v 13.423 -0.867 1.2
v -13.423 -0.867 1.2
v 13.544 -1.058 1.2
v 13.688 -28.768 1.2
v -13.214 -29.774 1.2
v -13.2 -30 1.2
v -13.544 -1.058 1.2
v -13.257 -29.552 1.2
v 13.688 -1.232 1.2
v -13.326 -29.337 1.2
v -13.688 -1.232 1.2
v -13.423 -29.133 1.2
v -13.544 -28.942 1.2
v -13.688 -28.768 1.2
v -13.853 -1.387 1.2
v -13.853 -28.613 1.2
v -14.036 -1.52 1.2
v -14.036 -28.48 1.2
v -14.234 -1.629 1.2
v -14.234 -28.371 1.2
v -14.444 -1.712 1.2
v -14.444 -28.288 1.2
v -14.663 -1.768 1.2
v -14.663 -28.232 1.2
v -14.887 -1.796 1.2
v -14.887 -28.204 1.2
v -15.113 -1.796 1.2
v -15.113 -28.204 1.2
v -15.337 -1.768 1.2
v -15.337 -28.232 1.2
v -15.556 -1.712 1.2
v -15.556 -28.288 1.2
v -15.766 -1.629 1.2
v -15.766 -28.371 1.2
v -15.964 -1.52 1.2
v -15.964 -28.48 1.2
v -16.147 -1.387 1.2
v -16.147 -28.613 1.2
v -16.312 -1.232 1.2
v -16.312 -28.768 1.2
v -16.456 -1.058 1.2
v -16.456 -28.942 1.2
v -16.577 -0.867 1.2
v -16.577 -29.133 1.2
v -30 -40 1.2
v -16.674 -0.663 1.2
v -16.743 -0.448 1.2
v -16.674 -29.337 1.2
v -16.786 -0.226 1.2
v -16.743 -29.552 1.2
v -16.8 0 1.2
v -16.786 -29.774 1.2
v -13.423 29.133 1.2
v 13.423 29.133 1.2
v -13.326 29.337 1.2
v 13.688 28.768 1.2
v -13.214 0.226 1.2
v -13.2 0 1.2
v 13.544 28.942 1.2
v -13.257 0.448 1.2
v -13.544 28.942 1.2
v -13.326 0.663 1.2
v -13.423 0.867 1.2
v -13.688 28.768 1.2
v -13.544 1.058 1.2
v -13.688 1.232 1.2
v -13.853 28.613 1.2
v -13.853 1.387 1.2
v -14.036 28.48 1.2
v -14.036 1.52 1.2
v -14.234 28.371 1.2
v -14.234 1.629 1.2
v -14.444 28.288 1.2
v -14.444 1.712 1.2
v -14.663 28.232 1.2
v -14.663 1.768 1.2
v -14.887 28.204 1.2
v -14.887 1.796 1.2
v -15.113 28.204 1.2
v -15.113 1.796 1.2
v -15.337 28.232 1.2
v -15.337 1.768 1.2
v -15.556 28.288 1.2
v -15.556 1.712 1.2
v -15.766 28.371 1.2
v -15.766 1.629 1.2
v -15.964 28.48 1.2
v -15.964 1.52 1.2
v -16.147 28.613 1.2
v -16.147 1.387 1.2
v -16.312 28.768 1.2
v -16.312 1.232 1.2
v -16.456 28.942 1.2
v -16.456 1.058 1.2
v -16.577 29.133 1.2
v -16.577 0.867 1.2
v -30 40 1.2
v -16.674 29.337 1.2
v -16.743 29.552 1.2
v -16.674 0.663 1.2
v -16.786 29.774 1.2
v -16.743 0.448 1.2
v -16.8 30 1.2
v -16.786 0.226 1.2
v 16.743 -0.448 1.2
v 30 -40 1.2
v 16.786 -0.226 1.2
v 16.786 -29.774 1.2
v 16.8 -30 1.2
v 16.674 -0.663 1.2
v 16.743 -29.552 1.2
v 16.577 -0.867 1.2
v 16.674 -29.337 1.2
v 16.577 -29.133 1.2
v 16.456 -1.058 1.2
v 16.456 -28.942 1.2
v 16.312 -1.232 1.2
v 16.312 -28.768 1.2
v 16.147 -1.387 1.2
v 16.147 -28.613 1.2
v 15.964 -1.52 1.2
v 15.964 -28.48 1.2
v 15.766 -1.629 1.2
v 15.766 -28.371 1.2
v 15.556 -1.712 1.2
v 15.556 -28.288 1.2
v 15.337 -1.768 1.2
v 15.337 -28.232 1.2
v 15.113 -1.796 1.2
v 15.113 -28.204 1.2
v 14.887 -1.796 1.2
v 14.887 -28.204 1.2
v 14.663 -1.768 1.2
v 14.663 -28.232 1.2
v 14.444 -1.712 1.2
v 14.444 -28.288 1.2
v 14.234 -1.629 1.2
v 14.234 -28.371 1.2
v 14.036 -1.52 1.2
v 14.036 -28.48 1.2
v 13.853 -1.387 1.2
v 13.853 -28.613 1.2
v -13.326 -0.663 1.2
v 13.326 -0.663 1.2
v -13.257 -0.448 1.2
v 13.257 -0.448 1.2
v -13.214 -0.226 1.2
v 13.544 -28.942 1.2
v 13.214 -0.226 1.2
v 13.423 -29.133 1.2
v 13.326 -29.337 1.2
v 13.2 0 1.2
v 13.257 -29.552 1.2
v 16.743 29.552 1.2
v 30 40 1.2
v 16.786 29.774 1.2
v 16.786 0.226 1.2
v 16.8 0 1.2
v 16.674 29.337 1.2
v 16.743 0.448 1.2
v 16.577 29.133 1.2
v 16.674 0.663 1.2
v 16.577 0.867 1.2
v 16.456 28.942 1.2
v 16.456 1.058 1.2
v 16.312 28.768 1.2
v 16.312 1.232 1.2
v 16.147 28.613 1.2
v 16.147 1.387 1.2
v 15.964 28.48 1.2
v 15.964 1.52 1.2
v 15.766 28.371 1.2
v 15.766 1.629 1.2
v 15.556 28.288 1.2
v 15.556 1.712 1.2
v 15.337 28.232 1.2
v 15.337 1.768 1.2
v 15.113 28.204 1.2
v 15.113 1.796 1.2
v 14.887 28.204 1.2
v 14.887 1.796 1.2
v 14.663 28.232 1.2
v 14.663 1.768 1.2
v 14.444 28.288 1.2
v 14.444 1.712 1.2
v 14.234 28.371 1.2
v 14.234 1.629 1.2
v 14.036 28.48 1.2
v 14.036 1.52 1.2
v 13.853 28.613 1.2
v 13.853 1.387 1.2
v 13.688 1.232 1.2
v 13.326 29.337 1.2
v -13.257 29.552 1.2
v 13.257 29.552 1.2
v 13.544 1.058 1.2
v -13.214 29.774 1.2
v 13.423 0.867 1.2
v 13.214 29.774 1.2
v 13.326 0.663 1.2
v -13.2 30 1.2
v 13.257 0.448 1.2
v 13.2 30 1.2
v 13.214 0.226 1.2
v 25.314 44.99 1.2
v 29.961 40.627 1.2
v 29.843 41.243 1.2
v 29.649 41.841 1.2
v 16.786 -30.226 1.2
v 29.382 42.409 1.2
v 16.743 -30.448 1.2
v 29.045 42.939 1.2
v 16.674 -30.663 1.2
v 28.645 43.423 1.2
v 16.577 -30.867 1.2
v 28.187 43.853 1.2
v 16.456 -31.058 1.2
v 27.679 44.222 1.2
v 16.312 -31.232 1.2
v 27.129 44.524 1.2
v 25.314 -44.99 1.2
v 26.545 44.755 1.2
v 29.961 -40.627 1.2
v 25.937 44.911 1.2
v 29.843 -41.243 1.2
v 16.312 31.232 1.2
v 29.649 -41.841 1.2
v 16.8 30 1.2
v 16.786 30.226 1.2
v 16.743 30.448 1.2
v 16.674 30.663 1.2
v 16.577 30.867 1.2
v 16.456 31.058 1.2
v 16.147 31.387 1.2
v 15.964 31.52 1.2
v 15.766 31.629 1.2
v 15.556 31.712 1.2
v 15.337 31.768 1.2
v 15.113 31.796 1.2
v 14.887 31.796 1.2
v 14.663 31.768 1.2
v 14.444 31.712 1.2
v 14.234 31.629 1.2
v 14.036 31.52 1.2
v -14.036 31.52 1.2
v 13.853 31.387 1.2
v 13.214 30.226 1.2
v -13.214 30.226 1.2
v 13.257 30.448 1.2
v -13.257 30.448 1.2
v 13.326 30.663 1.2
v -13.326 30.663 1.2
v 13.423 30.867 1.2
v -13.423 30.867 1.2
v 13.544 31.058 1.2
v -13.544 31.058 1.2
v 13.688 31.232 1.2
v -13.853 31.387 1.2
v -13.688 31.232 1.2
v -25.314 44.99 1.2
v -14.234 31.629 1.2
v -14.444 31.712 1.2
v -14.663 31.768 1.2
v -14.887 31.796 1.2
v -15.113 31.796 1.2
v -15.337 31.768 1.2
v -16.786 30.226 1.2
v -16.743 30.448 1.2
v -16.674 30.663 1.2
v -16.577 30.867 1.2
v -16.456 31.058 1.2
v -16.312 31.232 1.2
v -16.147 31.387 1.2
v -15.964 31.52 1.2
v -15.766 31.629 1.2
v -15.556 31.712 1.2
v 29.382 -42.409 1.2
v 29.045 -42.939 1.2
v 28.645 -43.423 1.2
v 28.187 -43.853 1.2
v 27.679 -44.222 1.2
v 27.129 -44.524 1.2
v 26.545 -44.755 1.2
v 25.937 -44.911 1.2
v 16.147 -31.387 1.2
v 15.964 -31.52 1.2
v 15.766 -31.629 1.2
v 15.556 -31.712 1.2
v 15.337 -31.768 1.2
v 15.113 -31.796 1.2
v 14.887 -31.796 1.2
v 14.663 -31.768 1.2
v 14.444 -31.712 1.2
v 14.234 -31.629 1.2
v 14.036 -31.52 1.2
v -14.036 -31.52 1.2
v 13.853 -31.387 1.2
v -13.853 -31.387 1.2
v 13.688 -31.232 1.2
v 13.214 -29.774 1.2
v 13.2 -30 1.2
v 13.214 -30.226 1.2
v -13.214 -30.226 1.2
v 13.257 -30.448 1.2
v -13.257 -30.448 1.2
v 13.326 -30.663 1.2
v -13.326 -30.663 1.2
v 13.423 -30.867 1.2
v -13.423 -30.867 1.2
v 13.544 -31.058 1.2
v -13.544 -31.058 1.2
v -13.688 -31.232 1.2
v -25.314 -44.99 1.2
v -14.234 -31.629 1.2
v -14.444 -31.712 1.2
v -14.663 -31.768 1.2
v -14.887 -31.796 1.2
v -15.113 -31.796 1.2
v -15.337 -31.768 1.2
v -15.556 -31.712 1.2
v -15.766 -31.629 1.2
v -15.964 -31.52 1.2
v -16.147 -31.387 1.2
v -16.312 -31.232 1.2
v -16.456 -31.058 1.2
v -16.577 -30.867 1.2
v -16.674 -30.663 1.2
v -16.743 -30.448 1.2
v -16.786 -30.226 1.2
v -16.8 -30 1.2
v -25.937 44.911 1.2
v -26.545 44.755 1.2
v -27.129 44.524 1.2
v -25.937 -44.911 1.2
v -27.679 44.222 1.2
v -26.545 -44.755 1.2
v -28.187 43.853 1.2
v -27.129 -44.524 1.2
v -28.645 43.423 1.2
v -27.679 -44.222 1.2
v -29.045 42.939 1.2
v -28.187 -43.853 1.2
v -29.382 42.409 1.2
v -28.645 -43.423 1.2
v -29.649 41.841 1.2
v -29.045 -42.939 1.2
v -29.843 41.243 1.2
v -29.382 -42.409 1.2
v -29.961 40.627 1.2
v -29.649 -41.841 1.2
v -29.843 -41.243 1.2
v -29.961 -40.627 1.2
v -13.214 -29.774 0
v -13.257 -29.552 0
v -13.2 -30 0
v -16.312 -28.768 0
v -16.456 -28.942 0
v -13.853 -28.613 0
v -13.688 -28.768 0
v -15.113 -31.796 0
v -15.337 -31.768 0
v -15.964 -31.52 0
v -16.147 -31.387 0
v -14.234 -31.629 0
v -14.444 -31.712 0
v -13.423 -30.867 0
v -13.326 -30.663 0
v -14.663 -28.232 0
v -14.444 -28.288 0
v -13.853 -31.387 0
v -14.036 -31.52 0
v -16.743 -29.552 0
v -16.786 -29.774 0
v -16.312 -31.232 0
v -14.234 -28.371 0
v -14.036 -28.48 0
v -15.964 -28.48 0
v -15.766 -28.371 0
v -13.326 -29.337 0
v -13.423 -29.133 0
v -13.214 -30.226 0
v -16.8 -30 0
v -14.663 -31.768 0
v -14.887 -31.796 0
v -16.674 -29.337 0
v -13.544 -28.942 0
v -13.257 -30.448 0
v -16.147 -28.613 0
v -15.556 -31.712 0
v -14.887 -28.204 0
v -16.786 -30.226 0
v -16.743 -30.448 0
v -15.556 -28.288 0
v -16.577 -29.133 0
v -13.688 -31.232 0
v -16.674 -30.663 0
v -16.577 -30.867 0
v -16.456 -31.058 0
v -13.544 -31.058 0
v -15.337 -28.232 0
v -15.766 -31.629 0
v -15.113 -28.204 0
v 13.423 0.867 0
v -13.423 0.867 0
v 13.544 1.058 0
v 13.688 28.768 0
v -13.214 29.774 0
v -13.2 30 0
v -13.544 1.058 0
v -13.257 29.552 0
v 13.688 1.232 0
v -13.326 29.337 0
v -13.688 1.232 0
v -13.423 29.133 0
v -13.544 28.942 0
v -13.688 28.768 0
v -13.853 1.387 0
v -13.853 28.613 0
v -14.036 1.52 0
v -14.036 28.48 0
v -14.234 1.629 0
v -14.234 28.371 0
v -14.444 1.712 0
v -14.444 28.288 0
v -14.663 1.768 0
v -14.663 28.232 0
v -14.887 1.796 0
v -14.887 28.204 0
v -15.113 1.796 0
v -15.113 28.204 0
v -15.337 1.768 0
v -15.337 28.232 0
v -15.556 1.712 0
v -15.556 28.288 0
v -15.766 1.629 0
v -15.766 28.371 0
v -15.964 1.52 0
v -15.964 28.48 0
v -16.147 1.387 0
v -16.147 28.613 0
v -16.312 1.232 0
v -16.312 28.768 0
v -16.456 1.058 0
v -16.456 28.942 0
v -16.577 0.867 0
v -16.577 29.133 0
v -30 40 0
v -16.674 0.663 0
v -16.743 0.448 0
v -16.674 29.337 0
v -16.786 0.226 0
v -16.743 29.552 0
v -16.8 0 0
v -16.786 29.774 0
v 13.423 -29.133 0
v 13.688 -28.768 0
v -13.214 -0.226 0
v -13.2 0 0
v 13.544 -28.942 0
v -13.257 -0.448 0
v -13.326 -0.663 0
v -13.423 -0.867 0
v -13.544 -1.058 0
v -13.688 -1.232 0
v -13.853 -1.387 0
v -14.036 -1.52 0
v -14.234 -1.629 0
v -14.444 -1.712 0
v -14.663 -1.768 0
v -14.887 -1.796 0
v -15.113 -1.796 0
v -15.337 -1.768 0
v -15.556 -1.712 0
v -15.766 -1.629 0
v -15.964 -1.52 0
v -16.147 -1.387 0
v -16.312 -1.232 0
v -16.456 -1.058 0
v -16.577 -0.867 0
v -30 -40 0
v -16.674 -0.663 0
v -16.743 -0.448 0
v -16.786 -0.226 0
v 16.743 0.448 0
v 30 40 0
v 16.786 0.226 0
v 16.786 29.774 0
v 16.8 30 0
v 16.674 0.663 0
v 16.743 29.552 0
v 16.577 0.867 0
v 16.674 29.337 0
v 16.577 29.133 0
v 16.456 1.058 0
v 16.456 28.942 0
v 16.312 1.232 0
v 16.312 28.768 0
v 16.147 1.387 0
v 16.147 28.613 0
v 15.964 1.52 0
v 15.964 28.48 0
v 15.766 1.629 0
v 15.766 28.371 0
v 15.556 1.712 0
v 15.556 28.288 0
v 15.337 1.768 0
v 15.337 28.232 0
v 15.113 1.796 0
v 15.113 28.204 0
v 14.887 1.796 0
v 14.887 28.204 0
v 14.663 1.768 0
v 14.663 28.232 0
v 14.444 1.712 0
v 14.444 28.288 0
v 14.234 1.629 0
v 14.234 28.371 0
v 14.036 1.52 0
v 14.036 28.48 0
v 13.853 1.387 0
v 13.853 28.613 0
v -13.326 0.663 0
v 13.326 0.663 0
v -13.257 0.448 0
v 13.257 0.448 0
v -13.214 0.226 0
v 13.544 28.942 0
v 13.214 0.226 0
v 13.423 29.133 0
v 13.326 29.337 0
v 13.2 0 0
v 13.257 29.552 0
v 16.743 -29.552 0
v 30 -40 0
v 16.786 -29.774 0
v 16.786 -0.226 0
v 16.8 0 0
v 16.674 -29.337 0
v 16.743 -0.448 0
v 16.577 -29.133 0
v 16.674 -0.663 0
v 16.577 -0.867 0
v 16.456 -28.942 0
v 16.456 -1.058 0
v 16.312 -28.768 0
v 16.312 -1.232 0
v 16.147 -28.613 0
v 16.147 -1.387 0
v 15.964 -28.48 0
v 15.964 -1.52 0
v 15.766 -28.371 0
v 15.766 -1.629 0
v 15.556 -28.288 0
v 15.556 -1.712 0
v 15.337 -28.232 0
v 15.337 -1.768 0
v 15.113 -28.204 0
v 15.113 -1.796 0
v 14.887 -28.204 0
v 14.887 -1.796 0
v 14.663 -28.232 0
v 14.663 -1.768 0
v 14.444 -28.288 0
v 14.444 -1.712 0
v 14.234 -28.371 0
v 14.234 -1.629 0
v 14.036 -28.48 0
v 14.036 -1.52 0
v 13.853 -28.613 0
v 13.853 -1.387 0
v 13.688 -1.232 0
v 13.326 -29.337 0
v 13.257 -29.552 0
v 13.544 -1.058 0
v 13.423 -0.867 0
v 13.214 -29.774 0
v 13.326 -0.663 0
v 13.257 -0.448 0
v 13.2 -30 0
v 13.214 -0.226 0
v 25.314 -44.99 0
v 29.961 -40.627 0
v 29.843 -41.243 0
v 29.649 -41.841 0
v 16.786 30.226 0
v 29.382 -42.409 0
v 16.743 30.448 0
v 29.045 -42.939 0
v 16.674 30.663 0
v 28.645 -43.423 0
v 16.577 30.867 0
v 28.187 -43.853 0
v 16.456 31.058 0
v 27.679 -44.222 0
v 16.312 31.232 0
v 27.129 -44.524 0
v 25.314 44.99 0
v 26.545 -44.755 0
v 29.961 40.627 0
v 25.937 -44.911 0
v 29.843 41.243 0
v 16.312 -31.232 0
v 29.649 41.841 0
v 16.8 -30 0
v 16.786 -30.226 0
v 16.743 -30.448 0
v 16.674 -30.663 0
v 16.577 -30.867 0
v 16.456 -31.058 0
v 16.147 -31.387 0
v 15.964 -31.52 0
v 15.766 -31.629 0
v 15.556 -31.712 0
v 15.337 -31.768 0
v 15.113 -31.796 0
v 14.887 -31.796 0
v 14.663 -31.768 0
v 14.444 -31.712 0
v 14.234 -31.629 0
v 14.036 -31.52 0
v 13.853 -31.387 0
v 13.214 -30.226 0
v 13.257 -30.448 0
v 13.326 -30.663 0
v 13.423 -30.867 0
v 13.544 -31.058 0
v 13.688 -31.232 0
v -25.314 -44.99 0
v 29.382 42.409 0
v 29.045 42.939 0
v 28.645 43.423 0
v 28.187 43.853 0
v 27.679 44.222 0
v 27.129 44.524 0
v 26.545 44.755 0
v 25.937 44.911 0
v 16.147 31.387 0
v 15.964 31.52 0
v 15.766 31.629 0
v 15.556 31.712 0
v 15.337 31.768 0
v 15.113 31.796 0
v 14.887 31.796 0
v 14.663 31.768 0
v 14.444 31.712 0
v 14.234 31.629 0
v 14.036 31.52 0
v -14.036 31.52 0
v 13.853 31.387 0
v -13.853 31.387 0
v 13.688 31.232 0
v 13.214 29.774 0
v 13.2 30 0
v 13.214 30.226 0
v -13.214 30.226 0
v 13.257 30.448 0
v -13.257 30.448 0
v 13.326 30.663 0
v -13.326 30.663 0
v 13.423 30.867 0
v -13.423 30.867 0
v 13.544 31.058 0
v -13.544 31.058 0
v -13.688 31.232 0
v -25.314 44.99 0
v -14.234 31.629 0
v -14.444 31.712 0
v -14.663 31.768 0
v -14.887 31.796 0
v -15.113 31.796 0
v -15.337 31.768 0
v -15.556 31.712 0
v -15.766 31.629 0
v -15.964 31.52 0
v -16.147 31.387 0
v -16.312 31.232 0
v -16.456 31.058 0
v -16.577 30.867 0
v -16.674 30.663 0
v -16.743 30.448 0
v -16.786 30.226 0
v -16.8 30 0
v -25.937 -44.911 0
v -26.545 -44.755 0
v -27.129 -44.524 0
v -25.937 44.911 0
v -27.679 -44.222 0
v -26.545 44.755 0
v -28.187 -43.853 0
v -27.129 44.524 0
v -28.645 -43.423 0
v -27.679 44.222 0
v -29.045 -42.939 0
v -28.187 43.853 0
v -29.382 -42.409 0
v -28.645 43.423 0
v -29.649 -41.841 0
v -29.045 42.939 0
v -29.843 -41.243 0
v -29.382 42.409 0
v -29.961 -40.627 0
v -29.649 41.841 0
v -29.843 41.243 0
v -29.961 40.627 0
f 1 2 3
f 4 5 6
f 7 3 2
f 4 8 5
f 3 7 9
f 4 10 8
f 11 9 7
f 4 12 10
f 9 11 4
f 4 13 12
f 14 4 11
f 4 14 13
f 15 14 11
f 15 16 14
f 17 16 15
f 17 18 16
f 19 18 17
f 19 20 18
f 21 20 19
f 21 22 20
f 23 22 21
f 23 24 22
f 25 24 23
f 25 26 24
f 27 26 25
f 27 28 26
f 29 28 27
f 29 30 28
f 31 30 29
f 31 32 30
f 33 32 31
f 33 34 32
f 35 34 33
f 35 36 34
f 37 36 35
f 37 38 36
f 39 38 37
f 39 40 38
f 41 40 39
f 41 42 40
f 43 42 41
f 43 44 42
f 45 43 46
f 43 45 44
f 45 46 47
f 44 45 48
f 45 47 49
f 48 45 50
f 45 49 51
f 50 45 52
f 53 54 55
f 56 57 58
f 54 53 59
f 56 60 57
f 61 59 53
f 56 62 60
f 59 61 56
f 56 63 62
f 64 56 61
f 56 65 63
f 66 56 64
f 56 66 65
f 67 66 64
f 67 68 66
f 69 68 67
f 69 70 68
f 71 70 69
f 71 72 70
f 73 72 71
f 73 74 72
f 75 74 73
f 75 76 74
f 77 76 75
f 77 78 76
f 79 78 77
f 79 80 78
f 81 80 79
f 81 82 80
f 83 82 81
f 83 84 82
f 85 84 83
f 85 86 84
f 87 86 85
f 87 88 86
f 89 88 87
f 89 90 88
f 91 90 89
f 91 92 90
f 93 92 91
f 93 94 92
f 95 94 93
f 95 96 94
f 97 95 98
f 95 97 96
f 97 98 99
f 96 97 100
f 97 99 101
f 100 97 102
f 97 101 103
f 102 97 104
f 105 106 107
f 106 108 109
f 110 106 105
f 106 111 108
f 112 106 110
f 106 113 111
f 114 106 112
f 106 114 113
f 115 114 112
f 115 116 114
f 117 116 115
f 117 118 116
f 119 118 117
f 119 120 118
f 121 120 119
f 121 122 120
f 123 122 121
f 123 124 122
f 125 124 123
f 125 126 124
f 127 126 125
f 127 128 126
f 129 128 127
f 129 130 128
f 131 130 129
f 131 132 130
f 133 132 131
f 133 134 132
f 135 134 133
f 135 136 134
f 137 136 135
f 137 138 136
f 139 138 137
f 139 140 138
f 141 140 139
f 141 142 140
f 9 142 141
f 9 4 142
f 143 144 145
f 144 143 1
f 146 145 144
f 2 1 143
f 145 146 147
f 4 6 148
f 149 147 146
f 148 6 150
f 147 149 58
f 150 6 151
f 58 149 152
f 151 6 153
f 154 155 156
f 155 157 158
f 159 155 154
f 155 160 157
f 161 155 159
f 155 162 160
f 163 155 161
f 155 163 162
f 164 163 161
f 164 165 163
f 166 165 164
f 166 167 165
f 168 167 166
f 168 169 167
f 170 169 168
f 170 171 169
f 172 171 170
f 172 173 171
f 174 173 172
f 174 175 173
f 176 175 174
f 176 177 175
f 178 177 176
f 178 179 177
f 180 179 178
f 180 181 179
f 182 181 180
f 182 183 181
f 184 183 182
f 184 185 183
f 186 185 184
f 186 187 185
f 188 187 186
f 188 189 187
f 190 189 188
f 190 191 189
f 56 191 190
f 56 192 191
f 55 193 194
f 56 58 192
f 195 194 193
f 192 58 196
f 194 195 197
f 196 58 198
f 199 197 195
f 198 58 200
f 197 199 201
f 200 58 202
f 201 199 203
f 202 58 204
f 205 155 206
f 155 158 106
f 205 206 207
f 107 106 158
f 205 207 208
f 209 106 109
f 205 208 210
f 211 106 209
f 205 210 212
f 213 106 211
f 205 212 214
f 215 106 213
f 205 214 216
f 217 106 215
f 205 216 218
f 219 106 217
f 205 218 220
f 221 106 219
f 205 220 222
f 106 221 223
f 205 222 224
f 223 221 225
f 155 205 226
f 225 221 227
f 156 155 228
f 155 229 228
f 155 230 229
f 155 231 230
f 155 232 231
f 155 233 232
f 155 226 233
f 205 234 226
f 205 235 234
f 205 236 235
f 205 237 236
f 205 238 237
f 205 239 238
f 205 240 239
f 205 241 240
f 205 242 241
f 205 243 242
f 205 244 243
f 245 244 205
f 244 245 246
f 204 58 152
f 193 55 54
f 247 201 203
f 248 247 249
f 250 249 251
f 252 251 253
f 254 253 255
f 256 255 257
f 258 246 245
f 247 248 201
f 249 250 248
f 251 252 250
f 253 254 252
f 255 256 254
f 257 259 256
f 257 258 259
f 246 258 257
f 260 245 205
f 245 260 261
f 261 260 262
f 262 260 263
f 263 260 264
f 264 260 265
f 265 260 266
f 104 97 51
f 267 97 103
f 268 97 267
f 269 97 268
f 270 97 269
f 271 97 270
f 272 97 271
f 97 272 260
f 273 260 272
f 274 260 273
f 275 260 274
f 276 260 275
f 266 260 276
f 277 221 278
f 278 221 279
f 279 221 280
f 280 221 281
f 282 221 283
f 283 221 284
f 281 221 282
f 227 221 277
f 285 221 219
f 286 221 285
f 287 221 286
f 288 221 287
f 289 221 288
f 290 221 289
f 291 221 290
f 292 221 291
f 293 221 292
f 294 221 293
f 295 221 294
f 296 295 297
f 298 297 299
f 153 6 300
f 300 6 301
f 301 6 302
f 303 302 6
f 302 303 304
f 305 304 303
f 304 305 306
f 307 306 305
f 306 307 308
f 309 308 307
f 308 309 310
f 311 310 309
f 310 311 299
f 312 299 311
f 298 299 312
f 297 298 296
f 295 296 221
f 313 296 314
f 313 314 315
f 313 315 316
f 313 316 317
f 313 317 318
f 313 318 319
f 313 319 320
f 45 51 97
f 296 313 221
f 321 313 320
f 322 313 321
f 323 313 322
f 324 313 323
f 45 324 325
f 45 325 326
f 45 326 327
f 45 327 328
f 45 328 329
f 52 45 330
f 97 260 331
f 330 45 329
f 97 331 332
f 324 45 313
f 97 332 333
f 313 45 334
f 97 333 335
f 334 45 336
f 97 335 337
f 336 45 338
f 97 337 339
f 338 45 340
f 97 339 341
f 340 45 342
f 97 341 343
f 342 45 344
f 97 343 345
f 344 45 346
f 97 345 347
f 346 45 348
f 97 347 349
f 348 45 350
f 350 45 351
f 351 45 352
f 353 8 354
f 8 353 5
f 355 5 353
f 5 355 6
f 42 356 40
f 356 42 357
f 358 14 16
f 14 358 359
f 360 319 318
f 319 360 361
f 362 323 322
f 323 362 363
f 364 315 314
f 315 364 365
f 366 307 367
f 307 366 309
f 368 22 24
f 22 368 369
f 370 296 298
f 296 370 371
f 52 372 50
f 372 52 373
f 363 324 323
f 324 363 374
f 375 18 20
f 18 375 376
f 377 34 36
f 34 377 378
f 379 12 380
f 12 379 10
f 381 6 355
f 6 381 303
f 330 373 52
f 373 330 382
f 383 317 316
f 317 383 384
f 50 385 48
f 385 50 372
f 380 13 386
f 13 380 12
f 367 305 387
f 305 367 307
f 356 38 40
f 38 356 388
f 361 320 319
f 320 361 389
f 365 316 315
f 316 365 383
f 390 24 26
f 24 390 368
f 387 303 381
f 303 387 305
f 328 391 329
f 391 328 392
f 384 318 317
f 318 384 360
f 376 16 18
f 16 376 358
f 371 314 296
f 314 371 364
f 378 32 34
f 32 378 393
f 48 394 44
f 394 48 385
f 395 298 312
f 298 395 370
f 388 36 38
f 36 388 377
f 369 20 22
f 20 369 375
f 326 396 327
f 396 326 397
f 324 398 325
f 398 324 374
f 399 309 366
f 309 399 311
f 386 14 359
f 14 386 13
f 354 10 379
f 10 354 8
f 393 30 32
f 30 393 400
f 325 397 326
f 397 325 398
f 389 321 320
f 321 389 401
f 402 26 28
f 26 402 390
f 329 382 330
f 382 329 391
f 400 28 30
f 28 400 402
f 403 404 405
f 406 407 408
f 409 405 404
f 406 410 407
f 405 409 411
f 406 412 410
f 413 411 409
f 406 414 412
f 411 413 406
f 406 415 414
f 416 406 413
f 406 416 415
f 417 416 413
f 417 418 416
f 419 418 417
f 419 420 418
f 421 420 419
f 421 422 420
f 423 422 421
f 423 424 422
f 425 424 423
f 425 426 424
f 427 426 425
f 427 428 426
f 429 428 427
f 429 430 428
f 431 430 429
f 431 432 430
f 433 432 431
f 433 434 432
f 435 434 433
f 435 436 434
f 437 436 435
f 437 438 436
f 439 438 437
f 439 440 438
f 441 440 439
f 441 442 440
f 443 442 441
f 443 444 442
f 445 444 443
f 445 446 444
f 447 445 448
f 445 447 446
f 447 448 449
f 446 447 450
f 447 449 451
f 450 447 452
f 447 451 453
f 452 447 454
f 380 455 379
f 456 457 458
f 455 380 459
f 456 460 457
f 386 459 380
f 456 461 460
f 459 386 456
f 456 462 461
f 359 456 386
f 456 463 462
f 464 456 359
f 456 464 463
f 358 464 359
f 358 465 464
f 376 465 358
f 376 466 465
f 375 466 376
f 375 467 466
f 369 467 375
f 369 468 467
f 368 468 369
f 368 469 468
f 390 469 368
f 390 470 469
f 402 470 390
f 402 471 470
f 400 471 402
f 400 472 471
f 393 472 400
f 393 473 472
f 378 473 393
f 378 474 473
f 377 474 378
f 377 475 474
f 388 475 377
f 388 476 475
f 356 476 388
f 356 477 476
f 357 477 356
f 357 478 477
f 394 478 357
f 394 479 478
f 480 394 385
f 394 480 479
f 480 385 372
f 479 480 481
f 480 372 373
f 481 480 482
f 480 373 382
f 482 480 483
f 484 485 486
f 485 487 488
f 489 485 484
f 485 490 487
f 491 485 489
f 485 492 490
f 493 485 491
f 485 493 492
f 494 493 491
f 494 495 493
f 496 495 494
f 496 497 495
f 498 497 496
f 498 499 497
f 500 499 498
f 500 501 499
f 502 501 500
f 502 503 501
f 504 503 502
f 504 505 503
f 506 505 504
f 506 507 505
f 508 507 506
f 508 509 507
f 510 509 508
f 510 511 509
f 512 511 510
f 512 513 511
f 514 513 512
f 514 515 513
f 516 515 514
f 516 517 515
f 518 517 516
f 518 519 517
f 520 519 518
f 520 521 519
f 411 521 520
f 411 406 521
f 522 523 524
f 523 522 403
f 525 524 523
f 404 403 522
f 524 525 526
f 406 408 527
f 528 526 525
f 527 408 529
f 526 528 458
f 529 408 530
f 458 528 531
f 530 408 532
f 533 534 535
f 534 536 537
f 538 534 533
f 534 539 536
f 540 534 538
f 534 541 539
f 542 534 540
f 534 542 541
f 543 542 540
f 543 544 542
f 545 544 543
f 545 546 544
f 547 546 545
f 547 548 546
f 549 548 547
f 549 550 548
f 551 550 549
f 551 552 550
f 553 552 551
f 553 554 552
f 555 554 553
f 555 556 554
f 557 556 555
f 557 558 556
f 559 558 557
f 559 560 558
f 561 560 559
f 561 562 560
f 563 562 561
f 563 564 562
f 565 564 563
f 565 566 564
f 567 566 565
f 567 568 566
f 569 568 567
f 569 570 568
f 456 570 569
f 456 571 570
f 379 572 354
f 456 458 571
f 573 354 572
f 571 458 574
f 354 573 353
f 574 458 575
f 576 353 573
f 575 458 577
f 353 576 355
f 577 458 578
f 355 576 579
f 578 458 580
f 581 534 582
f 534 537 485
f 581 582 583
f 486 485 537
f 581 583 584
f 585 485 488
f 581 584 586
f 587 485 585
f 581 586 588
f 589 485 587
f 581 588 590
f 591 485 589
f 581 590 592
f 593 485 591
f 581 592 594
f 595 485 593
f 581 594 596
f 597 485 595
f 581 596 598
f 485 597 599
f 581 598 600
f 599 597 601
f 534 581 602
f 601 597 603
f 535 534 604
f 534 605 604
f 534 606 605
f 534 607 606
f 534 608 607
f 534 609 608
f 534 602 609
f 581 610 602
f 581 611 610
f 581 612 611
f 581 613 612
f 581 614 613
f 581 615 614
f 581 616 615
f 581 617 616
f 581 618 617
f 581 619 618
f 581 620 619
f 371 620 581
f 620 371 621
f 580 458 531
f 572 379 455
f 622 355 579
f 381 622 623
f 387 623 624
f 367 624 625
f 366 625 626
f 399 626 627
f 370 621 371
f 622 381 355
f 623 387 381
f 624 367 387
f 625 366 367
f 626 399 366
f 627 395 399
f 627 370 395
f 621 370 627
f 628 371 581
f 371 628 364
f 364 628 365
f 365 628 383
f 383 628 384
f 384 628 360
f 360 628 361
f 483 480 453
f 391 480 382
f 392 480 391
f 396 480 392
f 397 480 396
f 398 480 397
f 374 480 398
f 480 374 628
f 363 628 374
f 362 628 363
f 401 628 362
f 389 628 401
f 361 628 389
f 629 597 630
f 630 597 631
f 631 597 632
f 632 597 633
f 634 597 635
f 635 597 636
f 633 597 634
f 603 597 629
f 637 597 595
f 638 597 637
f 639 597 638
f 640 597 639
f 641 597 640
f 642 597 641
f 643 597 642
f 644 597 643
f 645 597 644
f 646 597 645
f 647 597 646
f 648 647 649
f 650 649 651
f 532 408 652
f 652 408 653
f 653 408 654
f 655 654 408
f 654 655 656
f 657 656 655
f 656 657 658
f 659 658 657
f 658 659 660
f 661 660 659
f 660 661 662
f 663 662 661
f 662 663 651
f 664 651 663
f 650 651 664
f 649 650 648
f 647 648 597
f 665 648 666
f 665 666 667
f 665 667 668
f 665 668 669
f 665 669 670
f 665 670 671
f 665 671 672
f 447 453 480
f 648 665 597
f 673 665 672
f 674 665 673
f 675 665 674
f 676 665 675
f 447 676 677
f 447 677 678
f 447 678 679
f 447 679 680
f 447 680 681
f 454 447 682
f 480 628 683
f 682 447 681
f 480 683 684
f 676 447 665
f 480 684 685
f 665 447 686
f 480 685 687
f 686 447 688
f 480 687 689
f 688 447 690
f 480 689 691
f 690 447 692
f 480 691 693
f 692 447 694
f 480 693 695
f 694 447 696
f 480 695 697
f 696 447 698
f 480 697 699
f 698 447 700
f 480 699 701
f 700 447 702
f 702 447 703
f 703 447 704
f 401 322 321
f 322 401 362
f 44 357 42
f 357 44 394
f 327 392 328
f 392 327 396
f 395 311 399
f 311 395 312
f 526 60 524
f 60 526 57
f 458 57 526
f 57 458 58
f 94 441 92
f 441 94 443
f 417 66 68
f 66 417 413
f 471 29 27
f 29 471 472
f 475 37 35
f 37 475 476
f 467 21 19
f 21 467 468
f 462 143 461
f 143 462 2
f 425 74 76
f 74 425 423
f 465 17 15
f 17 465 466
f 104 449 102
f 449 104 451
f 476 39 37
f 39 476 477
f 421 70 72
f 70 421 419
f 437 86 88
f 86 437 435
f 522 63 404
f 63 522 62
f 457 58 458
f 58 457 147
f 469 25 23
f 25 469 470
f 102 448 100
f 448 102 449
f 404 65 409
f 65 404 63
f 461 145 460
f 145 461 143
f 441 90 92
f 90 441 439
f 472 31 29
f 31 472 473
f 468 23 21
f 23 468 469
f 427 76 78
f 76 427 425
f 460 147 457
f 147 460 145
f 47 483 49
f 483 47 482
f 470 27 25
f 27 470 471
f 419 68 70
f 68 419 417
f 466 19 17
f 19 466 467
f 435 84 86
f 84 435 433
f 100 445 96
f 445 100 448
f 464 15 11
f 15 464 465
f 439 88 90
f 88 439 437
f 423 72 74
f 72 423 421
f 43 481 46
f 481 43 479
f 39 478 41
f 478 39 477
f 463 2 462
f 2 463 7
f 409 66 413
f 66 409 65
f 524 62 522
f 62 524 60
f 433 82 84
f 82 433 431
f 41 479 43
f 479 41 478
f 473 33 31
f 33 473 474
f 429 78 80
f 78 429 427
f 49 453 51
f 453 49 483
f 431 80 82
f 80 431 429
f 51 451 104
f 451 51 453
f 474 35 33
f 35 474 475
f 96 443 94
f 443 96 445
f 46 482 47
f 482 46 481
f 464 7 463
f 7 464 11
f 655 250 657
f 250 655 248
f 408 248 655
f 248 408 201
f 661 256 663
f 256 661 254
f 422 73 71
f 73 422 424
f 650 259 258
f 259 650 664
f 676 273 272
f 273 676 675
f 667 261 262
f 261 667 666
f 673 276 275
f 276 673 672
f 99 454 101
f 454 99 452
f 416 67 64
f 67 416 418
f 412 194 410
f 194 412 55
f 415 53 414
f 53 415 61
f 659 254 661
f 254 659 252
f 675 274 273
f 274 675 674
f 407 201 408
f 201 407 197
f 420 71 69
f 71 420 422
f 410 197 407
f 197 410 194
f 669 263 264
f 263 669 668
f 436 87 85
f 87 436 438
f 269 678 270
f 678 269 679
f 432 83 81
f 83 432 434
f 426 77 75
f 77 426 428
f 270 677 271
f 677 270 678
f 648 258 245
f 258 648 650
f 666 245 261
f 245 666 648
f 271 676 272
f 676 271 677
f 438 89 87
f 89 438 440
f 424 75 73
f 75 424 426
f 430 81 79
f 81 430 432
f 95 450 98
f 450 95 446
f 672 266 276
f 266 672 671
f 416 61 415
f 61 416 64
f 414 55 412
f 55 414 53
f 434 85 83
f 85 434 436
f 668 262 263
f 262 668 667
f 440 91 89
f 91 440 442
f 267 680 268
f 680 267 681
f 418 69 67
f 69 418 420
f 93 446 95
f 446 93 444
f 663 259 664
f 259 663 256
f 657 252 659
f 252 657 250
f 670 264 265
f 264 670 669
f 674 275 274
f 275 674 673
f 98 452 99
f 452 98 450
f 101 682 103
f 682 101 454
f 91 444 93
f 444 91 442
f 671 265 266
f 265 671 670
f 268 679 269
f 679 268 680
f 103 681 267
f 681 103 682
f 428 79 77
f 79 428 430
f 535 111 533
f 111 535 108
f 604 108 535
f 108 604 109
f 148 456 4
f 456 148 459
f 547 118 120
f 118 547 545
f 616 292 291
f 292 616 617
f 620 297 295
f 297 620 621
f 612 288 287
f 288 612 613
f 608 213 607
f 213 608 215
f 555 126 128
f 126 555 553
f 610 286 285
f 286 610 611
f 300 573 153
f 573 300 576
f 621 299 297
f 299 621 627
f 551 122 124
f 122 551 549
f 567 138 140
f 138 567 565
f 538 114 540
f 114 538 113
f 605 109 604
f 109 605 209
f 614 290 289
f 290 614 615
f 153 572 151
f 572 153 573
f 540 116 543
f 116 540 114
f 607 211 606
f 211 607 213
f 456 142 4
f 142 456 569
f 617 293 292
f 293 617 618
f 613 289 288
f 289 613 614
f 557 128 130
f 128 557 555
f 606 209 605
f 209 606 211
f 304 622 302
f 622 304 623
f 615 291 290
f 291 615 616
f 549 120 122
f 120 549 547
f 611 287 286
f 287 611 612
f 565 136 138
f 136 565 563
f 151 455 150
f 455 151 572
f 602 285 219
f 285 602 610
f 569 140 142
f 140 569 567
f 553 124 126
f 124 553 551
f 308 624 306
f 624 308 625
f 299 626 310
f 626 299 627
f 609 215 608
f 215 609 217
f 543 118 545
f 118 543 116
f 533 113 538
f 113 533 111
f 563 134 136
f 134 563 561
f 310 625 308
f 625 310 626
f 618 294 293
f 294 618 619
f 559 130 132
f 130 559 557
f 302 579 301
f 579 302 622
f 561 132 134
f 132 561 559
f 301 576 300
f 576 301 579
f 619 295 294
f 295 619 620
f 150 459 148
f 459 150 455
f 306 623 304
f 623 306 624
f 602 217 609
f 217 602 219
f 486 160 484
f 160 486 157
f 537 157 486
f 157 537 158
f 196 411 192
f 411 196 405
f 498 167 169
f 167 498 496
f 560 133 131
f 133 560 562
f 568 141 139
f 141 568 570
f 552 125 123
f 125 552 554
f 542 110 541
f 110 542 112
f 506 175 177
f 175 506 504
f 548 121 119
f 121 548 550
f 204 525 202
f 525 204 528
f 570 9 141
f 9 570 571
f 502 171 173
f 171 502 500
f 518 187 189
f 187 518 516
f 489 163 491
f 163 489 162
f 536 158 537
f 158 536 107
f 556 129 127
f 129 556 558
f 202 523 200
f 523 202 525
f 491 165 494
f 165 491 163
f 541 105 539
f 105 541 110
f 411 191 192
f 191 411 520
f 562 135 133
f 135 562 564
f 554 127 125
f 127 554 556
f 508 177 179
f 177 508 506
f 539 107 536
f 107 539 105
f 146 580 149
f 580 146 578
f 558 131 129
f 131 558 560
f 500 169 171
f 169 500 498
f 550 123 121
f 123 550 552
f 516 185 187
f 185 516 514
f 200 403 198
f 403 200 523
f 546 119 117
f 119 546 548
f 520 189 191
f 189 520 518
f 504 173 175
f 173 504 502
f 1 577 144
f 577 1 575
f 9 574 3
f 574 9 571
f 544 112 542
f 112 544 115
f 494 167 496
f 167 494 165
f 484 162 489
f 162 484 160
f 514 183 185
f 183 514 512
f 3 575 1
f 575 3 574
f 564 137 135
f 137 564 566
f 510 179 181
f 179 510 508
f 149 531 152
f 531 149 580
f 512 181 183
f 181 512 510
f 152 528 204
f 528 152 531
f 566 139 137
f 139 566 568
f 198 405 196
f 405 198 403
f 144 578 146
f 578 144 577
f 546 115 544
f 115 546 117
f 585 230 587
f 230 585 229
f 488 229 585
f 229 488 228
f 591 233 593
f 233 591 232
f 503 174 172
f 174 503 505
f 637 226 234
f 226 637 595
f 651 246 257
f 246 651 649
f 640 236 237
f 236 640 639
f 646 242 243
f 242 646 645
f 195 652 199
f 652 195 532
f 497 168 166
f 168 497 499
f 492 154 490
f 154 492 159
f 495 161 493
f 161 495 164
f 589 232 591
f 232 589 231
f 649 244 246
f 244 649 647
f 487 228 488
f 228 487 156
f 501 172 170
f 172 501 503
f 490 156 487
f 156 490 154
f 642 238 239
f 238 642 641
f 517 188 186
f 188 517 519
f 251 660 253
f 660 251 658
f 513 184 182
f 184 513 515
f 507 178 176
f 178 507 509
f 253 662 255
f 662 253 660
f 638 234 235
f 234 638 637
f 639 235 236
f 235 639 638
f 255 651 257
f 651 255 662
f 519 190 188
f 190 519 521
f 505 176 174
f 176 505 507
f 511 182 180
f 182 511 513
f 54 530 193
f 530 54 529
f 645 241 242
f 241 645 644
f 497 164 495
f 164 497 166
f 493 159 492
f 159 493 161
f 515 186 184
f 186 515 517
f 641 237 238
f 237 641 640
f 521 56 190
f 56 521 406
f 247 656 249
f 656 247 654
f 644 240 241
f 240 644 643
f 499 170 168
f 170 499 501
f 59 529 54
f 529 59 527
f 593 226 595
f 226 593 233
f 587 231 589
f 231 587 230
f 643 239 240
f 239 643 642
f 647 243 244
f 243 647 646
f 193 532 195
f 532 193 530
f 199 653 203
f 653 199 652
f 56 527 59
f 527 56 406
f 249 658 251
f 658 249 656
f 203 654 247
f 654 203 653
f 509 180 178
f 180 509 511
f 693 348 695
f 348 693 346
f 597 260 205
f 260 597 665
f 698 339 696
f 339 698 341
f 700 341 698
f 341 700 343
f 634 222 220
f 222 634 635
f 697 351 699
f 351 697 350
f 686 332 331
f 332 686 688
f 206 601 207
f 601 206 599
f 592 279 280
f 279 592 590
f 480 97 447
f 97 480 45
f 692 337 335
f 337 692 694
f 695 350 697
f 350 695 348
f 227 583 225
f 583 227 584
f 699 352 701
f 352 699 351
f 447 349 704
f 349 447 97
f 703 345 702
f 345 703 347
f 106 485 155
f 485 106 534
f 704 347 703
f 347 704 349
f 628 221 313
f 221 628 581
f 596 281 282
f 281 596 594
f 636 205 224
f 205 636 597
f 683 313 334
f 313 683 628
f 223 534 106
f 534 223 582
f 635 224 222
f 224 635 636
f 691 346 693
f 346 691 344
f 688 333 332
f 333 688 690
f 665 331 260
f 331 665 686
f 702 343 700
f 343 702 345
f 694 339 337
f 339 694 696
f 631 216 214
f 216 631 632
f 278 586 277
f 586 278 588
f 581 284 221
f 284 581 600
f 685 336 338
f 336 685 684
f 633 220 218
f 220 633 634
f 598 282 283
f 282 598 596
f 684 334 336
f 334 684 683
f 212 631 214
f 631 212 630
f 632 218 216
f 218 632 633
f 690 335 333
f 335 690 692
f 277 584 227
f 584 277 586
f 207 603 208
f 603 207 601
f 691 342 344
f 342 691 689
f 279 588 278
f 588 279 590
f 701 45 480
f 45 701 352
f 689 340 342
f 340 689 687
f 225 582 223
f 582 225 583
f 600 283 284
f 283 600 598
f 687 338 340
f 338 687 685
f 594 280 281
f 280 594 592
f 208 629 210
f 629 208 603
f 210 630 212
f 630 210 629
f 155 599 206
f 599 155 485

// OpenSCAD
$fn = 50;


difference() {
	union() {
		hull() {
			translate(v = [-25.0000000000, 40.0000000000, 0]) {
				cylinder(h = 18, r = 5);
			}
			translate(v = [25.0000000000, 40.0000000000, 0]) {
				cylinder(h = 18, r = 5);
			}
			translate(v = [-25.0000000000, -40.0000000000, 0]) {
				cylinder(h = 18, r = 5);
			}
			translate(v = [25.0000000000, -40.0000000000, 0]) {
				cylinder(h = 18, r = 5);
			}
		}
	}
	union() {
		translate(v = [0, 0, 1.2000000000]) {
			hull() {
				translate(v = [-25.0000000000, 40.0000000000, 0]) {
					cylinder(h = 16.8000000000, r = 3.8000000000);
				}
				translate(v = [25.0000000000, 40.0000000000, 0]) {
					cylinder(h = 16.8000000000, r = 3.8000000000);
				}
				translate(v = [-25.0000000000, -40.0000000000, 0]) {
					cylinder(h = 16.8000000000, r = 3.8000000000);
				}
				translate(v = [25.0000000000, -40.0000000000, 0]) {
					cylinder(h = 16.8000000000, r = 3.8000000000);
				}
			}
		}
		#translate(v = [-15.0000000000, -30.0000000000, 0]) {
			cylinder(h = 1.2000000000, r = 1.8000000000);
		}
		#translate(v = [-15.0000000000, 0.0000000000, 0]) {
			cylinder(h = 1.2000000000, r = 1.8000000000);
		}
		#translate(v = [-15.0000000000, 30.0000000000, 0]) {
			cylinder(h = 1.2000000000, r = 1.8000000000);
		}
		#translate(v = [15.0000000000, -30.0000000000, 0]) {
			cylinder(h = 1.2000000000, r = 1.8000000000);
		}
		#translate(v = [15.0000000000, 0.0000000000, 0]) {
			cylinder(h = 1.2000000000, r = 1.8000000000);
		}
		#translate(v = [15.0000000000, 30.0000000000, 0]) {
			cylinder(h = 1.2000000000, r = 1.8000000000);
		}
		translate(v = [-250.0000000000, -250.0000000000, 1.2000000000]) {
			cube(size = [500, 500, 500]);
		}
		translate(v = [-250.0000000000, -250.0000000000, 1.2000000000]) {
			cube(size = [500, 500, 500]);
		}
		translate(v = [-250.0000000000, -250.0000000000, 1.2000000000]) {
			cube(size = [500, 500, 500]);
		}
	}
}
